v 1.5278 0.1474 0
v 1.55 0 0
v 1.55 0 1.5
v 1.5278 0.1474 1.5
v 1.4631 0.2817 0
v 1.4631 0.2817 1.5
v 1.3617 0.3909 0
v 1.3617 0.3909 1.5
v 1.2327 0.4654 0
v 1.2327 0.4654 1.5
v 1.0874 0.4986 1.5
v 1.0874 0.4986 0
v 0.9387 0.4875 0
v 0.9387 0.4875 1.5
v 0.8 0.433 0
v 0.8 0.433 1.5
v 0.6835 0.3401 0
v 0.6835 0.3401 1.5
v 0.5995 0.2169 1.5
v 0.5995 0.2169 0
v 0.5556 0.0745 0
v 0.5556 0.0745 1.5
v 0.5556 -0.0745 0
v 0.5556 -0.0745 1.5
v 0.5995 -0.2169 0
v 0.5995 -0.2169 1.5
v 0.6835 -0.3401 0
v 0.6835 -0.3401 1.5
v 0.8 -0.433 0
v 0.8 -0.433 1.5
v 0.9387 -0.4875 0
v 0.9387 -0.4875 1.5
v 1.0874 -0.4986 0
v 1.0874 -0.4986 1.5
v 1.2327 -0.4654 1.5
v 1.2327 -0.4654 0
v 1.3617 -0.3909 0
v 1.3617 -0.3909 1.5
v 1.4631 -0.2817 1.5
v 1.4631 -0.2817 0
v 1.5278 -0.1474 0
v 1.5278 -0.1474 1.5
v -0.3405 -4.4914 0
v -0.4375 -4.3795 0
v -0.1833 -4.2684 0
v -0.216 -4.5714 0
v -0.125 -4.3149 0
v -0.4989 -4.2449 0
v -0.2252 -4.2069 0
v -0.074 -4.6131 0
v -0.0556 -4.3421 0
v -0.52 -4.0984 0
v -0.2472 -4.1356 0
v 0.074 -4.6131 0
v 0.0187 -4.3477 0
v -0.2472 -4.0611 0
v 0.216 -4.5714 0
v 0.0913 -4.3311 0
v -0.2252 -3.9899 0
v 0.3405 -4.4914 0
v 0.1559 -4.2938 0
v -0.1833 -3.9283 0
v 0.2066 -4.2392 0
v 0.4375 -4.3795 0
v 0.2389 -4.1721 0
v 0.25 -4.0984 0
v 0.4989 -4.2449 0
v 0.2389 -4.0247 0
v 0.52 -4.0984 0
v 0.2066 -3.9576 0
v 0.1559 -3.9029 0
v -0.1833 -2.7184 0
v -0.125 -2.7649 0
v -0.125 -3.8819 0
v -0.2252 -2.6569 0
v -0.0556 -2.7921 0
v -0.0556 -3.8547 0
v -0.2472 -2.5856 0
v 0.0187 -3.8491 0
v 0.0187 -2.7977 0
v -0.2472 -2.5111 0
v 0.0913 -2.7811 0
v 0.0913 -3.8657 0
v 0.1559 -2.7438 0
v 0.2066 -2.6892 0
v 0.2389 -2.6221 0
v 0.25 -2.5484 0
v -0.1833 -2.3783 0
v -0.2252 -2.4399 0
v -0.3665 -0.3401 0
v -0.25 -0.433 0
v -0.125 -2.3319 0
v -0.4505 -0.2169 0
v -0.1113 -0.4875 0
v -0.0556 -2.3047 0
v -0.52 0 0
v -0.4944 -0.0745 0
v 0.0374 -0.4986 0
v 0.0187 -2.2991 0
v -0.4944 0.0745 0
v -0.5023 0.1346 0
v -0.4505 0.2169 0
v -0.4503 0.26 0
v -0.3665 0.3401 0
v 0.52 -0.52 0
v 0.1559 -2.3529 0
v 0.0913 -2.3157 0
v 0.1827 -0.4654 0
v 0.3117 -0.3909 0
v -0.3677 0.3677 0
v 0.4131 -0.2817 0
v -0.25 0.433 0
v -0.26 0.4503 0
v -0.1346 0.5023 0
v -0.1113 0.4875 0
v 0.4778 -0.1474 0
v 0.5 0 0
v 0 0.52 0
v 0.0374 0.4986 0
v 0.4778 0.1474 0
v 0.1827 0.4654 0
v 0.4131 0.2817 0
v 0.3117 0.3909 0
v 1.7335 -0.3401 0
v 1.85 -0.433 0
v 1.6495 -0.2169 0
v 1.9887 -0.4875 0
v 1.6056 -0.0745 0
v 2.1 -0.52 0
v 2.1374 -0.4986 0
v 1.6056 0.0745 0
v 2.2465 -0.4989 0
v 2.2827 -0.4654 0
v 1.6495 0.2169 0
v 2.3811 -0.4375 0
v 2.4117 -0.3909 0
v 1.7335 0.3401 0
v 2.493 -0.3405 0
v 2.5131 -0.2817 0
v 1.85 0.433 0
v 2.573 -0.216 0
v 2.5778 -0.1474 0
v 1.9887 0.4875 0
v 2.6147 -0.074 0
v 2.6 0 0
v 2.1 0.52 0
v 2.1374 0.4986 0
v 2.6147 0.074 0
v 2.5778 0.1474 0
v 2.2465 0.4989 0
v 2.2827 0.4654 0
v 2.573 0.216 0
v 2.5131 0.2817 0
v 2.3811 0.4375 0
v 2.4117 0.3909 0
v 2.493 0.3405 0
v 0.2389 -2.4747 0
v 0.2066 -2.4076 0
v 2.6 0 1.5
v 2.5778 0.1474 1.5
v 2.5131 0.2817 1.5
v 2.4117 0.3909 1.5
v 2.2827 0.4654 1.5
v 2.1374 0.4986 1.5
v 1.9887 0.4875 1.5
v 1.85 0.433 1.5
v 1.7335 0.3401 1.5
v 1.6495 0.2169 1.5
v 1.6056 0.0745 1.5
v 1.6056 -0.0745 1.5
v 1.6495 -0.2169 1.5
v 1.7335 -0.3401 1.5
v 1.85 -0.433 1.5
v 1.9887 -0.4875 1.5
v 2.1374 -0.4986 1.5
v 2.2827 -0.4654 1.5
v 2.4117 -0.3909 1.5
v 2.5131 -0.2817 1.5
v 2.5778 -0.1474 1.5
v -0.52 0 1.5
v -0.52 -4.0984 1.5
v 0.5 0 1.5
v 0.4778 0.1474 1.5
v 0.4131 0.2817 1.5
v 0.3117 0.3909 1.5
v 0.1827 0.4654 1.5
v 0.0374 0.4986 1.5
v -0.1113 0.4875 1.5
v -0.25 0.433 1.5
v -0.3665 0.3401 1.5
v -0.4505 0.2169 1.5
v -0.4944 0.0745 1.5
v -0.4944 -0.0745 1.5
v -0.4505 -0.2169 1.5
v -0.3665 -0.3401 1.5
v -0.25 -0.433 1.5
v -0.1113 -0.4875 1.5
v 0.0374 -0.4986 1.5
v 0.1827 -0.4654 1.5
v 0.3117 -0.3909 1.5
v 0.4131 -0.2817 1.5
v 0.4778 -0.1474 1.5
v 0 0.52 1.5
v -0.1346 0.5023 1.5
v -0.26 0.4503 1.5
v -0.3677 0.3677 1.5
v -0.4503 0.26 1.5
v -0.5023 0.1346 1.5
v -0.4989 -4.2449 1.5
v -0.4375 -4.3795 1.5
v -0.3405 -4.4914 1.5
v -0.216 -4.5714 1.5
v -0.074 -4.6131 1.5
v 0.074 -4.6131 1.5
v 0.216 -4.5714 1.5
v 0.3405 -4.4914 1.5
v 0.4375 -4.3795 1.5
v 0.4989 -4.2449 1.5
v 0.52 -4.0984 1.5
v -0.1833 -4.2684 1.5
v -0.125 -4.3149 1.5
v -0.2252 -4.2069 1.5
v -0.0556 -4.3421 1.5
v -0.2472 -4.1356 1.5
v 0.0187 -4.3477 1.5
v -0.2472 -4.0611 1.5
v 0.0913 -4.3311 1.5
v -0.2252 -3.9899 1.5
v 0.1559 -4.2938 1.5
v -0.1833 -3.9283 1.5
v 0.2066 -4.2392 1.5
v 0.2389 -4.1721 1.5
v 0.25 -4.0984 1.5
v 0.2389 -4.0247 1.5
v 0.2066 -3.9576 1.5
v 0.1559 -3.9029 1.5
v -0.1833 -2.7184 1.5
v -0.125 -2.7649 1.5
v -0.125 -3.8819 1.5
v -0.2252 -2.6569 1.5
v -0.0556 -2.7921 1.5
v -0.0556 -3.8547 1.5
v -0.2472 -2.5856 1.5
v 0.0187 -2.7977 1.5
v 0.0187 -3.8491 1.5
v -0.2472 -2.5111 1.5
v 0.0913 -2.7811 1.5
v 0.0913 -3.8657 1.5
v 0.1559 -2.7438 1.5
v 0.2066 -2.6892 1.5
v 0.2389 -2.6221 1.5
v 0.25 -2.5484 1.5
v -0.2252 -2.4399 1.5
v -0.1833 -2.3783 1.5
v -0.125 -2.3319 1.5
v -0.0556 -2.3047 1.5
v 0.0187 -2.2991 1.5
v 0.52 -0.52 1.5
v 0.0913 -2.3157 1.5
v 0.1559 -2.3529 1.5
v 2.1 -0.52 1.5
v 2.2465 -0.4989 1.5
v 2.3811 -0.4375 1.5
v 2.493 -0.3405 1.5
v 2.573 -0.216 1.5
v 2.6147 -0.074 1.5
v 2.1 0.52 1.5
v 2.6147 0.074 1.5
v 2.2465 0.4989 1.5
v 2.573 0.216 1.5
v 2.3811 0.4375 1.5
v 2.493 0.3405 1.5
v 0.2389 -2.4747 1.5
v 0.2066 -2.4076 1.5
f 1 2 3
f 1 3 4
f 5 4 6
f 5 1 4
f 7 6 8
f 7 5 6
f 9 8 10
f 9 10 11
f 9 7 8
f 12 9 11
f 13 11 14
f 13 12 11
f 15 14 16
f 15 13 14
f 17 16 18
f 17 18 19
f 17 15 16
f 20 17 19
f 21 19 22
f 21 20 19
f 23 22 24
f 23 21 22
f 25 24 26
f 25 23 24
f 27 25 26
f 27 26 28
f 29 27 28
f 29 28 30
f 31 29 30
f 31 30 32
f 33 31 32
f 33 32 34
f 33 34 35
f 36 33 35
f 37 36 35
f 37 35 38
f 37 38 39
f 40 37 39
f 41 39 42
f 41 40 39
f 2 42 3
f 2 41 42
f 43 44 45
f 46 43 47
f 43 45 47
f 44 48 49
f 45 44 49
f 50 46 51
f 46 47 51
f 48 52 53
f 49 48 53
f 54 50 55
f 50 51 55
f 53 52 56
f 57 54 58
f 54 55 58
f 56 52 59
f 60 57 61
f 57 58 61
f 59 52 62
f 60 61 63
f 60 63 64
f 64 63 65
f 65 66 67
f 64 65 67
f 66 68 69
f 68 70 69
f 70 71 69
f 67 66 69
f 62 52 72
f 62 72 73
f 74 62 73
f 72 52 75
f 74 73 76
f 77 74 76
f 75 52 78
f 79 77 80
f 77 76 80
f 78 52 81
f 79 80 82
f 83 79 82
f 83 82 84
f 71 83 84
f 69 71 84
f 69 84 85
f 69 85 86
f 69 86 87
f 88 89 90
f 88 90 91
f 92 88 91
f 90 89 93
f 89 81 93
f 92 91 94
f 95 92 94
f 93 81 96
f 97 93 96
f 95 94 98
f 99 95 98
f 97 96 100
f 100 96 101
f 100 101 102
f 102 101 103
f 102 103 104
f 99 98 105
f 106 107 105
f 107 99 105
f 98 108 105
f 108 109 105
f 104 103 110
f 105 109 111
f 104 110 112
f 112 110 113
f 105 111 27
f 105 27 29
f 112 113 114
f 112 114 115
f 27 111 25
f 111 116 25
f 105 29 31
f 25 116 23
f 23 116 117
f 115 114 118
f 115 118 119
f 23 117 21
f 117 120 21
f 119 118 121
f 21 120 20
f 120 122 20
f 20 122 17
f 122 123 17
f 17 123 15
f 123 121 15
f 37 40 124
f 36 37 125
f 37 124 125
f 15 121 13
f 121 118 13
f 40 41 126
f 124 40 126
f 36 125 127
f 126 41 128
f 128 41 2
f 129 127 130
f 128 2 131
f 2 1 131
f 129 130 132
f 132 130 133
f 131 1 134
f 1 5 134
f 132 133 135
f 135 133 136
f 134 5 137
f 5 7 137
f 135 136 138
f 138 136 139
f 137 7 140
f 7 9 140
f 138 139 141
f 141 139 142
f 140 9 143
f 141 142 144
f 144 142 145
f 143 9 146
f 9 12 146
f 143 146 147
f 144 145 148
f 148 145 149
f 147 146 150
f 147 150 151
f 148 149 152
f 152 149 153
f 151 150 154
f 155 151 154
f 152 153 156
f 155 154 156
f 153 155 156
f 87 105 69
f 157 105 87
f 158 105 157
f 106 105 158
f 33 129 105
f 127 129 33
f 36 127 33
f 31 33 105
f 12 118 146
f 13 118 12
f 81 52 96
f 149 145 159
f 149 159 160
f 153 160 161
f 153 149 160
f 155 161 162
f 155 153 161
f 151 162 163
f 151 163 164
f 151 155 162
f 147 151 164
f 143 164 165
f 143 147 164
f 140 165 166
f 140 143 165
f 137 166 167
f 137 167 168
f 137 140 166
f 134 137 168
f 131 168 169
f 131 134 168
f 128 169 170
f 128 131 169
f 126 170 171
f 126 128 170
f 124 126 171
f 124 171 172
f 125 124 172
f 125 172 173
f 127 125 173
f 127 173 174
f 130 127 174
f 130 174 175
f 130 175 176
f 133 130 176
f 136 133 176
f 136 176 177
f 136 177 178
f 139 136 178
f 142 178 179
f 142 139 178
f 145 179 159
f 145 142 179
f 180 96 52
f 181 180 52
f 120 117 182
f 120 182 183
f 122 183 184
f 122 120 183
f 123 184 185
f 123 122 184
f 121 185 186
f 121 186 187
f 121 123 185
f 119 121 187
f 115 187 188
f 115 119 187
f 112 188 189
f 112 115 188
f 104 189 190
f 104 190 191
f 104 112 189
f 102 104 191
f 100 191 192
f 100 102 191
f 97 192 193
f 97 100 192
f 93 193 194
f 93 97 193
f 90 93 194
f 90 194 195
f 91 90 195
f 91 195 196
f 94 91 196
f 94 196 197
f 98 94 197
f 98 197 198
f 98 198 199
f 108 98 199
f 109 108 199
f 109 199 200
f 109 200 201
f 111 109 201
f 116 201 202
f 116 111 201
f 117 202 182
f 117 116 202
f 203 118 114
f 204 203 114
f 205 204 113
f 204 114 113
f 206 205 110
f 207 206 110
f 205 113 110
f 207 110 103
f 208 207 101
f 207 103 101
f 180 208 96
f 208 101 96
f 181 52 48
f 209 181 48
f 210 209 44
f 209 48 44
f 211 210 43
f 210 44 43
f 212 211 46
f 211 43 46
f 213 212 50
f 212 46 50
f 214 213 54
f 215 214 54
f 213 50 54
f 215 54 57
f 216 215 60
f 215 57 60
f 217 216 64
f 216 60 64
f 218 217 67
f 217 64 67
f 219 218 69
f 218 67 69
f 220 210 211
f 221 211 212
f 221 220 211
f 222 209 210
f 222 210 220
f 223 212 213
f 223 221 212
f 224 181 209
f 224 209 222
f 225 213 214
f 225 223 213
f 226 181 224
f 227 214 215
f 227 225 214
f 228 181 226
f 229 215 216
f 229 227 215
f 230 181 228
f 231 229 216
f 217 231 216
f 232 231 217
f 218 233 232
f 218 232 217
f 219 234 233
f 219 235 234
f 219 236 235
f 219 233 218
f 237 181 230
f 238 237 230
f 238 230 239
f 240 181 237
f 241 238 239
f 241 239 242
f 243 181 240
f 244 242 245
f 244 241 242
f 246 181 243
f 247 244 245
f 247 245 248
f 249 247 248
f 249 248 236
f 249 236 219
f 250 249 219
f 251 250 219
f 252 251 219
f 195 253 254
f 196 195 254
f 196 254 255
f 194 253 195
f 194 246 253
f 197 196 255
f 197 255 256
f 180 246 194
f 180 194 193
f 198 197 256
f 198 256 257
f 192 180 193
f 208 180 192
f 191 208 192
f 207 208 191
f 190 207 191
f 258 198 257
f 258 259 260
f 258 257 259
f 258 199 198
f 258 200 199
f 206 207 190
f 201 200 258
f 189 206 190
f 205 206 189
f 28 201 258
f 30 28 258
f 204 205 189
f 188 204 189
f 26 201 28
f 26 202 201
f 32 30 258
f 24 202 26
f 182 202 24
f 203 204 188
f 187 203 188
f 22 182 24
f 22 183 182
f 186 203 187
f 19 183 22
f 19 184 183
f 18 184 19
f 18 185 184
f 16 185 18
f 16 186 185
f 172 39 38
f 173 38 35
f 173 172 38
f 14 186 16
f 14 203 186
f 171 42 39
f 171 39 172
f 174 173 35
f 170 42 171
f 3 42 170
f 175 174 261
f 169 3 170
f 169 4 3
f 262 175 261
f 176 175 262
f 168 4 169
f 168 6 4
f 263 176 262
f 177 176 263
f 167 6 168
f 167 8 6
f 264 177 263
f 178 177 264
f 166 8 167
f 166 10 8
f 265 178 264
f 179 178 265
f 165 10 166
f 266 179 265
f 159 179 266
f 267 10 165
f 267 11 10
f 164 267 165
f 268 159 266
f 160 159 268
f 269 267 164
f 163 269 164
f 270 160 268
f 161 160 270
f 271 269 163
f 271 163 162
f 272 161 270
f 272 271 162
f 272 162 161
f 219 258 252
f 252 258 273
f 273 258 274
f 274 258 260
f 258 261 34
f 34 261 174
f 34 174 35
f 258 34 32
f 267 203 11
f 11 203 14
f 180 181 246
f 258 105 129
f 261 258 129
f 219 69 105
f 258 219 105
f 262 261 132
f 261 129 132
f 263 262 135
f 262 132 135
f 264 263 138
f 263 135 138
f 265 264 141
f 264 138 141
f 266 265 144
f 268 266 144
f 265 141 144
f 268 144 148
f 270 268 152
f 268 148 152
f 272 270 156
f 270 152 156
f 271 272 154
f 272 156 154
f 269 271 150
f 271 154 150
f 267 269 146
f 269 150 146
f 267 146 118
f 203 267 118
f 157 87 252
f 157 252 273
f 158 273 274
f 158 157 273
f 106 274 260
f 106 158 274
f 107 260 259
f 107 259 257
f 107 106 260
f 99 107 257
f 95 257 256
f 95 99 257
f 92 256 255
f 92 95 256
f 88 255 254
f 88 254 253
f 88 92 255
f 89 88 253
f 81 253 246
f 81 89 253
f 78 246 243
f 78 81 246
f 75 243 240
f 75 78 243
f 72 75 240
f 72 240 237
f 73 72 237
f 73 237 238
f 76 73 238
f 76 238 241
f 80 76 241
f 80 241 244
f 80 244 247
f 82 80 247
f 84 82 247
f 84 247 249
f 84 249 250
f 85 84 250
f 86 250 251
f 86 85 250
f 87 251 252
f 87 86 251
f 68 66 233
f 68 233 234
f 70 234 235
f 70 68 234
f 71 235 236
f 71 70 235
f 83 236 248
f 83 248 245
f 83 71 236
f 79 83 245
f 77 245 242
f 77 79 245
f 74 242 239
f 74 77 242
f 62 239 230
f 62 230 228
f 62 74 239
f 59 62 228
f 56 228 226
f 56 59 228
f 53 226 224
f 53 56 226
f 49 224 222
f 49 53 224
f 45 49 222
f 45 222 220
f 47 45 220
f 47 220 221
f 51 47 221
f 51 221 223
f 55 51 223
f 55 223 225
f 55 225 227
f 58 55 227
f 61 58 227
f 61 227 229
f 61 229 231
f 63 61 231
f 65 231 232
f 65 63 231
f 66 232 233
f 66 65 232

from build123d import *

# Parameters (mm, degrees)
SKETCH1_R           = 0.52
SKETCH1_R_2         = 0.5
SKETCH1_R_3         = 0.25
BOSS_EXTRUDE1_DEPTH = 1.5


with BuildPart() as part:
    # Sketch1 → Boss-Extrude1 (new body)
    # profile 1 of 8: a face of its own
    with BuildSketch(Plane.XY):
        with BuildLine():
            ThreePointArc((0.52, 0), (0, -0.52), (-0.52, 0))
            Line((-0.52, 0), (-0.52, -2.548388303))
            ThreePointArc((-0.52, -2.548388303), (0, -2.028388303), (0.52, -2.548388303))
            Line((0.52, -2.548388303), (0.52, -0.52))
            Line((0.52, -0.52), (1.05, -0.52))
            ThreePointArc((1.05, -0.52), (0.53, 0), (1.05, 0.52))
            Line((1.05, 0.52), (0, 0.52))
            ThreePointArc((0, 0.52), (0.367695526, 0.367695526), (0.52, 0))
        make_face()
    # profile 2 of 8: a face of its own
    with BuildSketch(Plane.XY):
        with BuildLine():
            Line((2.1, 0.52), (1.05, 0.52))
            ThreePointArc((1.05, 0.52), (1.417695526, 0.367695526), (1.57, 0))
            ThreePointArc((1.57, 0), (1.417695526, -0.367695526), (1.05, -0.52))
            Line((1.05, -0.52), (2.1, -0.52))
            ThreePointArc((2.1, -0.52), (1.58, 0), (2.1, 0.52))
        make_face()
    # profile 3 of 8: a face of its own
    with BuildSketch(Plane.XY):
        with Locations((2.1, 0)):
            Circle(SKETCH1_R)
        with Locations((2.1, 0)):
            Circle(SKETCH1_R_2, mode=Mode.SUBTRACT)
    # profile 4 of 8: a face of its own
    with BuildSketch(Plane.XY):
        Circle(SKETCH1_R)
        Circle(SKETCH1_R_2, mode=Mode.SUBTRACT)
    # profile 5 of 8: a face of its own
    with BuildSketch(Plane.XY):
        with Locations((1.05, 0)):
            Circle(SKETCH1_R)
        with Locations((1.05, 0)):
            Circle(SKETCH1_R_2, mode=Mode.SUBTRACT)
    # profile 6 of 8: a face of its own
    with BuildSketch(Plane.XY):
        with BuildLine():
            ThreePointArc((0.52, -2.548388303), (0, -3.068388303), (-0.52, -2.548388303))
            Line((-0.52, -2.548388303), (-0.52, -4.098388303))
            ThreePointArc((-0.52, -4.098388303), (0, -3.578388303), (0.52, -4.098388303))
            Line((0.52, -4.098388303), (0.52, -2.548388303))
        make_face()
    # profile 7 of 8: a face of its own
    with BuildSketch(Plane.XY):
        with Locations((0, -2.548388303)):
            Circle(SKETCH1_R)
        with Locations((0, -2.548388303)):
            Circle(SKETCH1_R_3, mode=Mode.SUBTRACT)
    # profile 8 of 8: a face of its own
    with BuildSketch(Plane.XY):
        with Locations((0, -4.098388303)):
            Circle(SKETCH1_R)
        with Locations((0, -4.098388303)):
            Circle(SKETCH1_R_3, mode=Mode.SUBTRACT)
    extrude(amount=BOSS_EXTRUDE1_DEPTH)


solid = part.part
